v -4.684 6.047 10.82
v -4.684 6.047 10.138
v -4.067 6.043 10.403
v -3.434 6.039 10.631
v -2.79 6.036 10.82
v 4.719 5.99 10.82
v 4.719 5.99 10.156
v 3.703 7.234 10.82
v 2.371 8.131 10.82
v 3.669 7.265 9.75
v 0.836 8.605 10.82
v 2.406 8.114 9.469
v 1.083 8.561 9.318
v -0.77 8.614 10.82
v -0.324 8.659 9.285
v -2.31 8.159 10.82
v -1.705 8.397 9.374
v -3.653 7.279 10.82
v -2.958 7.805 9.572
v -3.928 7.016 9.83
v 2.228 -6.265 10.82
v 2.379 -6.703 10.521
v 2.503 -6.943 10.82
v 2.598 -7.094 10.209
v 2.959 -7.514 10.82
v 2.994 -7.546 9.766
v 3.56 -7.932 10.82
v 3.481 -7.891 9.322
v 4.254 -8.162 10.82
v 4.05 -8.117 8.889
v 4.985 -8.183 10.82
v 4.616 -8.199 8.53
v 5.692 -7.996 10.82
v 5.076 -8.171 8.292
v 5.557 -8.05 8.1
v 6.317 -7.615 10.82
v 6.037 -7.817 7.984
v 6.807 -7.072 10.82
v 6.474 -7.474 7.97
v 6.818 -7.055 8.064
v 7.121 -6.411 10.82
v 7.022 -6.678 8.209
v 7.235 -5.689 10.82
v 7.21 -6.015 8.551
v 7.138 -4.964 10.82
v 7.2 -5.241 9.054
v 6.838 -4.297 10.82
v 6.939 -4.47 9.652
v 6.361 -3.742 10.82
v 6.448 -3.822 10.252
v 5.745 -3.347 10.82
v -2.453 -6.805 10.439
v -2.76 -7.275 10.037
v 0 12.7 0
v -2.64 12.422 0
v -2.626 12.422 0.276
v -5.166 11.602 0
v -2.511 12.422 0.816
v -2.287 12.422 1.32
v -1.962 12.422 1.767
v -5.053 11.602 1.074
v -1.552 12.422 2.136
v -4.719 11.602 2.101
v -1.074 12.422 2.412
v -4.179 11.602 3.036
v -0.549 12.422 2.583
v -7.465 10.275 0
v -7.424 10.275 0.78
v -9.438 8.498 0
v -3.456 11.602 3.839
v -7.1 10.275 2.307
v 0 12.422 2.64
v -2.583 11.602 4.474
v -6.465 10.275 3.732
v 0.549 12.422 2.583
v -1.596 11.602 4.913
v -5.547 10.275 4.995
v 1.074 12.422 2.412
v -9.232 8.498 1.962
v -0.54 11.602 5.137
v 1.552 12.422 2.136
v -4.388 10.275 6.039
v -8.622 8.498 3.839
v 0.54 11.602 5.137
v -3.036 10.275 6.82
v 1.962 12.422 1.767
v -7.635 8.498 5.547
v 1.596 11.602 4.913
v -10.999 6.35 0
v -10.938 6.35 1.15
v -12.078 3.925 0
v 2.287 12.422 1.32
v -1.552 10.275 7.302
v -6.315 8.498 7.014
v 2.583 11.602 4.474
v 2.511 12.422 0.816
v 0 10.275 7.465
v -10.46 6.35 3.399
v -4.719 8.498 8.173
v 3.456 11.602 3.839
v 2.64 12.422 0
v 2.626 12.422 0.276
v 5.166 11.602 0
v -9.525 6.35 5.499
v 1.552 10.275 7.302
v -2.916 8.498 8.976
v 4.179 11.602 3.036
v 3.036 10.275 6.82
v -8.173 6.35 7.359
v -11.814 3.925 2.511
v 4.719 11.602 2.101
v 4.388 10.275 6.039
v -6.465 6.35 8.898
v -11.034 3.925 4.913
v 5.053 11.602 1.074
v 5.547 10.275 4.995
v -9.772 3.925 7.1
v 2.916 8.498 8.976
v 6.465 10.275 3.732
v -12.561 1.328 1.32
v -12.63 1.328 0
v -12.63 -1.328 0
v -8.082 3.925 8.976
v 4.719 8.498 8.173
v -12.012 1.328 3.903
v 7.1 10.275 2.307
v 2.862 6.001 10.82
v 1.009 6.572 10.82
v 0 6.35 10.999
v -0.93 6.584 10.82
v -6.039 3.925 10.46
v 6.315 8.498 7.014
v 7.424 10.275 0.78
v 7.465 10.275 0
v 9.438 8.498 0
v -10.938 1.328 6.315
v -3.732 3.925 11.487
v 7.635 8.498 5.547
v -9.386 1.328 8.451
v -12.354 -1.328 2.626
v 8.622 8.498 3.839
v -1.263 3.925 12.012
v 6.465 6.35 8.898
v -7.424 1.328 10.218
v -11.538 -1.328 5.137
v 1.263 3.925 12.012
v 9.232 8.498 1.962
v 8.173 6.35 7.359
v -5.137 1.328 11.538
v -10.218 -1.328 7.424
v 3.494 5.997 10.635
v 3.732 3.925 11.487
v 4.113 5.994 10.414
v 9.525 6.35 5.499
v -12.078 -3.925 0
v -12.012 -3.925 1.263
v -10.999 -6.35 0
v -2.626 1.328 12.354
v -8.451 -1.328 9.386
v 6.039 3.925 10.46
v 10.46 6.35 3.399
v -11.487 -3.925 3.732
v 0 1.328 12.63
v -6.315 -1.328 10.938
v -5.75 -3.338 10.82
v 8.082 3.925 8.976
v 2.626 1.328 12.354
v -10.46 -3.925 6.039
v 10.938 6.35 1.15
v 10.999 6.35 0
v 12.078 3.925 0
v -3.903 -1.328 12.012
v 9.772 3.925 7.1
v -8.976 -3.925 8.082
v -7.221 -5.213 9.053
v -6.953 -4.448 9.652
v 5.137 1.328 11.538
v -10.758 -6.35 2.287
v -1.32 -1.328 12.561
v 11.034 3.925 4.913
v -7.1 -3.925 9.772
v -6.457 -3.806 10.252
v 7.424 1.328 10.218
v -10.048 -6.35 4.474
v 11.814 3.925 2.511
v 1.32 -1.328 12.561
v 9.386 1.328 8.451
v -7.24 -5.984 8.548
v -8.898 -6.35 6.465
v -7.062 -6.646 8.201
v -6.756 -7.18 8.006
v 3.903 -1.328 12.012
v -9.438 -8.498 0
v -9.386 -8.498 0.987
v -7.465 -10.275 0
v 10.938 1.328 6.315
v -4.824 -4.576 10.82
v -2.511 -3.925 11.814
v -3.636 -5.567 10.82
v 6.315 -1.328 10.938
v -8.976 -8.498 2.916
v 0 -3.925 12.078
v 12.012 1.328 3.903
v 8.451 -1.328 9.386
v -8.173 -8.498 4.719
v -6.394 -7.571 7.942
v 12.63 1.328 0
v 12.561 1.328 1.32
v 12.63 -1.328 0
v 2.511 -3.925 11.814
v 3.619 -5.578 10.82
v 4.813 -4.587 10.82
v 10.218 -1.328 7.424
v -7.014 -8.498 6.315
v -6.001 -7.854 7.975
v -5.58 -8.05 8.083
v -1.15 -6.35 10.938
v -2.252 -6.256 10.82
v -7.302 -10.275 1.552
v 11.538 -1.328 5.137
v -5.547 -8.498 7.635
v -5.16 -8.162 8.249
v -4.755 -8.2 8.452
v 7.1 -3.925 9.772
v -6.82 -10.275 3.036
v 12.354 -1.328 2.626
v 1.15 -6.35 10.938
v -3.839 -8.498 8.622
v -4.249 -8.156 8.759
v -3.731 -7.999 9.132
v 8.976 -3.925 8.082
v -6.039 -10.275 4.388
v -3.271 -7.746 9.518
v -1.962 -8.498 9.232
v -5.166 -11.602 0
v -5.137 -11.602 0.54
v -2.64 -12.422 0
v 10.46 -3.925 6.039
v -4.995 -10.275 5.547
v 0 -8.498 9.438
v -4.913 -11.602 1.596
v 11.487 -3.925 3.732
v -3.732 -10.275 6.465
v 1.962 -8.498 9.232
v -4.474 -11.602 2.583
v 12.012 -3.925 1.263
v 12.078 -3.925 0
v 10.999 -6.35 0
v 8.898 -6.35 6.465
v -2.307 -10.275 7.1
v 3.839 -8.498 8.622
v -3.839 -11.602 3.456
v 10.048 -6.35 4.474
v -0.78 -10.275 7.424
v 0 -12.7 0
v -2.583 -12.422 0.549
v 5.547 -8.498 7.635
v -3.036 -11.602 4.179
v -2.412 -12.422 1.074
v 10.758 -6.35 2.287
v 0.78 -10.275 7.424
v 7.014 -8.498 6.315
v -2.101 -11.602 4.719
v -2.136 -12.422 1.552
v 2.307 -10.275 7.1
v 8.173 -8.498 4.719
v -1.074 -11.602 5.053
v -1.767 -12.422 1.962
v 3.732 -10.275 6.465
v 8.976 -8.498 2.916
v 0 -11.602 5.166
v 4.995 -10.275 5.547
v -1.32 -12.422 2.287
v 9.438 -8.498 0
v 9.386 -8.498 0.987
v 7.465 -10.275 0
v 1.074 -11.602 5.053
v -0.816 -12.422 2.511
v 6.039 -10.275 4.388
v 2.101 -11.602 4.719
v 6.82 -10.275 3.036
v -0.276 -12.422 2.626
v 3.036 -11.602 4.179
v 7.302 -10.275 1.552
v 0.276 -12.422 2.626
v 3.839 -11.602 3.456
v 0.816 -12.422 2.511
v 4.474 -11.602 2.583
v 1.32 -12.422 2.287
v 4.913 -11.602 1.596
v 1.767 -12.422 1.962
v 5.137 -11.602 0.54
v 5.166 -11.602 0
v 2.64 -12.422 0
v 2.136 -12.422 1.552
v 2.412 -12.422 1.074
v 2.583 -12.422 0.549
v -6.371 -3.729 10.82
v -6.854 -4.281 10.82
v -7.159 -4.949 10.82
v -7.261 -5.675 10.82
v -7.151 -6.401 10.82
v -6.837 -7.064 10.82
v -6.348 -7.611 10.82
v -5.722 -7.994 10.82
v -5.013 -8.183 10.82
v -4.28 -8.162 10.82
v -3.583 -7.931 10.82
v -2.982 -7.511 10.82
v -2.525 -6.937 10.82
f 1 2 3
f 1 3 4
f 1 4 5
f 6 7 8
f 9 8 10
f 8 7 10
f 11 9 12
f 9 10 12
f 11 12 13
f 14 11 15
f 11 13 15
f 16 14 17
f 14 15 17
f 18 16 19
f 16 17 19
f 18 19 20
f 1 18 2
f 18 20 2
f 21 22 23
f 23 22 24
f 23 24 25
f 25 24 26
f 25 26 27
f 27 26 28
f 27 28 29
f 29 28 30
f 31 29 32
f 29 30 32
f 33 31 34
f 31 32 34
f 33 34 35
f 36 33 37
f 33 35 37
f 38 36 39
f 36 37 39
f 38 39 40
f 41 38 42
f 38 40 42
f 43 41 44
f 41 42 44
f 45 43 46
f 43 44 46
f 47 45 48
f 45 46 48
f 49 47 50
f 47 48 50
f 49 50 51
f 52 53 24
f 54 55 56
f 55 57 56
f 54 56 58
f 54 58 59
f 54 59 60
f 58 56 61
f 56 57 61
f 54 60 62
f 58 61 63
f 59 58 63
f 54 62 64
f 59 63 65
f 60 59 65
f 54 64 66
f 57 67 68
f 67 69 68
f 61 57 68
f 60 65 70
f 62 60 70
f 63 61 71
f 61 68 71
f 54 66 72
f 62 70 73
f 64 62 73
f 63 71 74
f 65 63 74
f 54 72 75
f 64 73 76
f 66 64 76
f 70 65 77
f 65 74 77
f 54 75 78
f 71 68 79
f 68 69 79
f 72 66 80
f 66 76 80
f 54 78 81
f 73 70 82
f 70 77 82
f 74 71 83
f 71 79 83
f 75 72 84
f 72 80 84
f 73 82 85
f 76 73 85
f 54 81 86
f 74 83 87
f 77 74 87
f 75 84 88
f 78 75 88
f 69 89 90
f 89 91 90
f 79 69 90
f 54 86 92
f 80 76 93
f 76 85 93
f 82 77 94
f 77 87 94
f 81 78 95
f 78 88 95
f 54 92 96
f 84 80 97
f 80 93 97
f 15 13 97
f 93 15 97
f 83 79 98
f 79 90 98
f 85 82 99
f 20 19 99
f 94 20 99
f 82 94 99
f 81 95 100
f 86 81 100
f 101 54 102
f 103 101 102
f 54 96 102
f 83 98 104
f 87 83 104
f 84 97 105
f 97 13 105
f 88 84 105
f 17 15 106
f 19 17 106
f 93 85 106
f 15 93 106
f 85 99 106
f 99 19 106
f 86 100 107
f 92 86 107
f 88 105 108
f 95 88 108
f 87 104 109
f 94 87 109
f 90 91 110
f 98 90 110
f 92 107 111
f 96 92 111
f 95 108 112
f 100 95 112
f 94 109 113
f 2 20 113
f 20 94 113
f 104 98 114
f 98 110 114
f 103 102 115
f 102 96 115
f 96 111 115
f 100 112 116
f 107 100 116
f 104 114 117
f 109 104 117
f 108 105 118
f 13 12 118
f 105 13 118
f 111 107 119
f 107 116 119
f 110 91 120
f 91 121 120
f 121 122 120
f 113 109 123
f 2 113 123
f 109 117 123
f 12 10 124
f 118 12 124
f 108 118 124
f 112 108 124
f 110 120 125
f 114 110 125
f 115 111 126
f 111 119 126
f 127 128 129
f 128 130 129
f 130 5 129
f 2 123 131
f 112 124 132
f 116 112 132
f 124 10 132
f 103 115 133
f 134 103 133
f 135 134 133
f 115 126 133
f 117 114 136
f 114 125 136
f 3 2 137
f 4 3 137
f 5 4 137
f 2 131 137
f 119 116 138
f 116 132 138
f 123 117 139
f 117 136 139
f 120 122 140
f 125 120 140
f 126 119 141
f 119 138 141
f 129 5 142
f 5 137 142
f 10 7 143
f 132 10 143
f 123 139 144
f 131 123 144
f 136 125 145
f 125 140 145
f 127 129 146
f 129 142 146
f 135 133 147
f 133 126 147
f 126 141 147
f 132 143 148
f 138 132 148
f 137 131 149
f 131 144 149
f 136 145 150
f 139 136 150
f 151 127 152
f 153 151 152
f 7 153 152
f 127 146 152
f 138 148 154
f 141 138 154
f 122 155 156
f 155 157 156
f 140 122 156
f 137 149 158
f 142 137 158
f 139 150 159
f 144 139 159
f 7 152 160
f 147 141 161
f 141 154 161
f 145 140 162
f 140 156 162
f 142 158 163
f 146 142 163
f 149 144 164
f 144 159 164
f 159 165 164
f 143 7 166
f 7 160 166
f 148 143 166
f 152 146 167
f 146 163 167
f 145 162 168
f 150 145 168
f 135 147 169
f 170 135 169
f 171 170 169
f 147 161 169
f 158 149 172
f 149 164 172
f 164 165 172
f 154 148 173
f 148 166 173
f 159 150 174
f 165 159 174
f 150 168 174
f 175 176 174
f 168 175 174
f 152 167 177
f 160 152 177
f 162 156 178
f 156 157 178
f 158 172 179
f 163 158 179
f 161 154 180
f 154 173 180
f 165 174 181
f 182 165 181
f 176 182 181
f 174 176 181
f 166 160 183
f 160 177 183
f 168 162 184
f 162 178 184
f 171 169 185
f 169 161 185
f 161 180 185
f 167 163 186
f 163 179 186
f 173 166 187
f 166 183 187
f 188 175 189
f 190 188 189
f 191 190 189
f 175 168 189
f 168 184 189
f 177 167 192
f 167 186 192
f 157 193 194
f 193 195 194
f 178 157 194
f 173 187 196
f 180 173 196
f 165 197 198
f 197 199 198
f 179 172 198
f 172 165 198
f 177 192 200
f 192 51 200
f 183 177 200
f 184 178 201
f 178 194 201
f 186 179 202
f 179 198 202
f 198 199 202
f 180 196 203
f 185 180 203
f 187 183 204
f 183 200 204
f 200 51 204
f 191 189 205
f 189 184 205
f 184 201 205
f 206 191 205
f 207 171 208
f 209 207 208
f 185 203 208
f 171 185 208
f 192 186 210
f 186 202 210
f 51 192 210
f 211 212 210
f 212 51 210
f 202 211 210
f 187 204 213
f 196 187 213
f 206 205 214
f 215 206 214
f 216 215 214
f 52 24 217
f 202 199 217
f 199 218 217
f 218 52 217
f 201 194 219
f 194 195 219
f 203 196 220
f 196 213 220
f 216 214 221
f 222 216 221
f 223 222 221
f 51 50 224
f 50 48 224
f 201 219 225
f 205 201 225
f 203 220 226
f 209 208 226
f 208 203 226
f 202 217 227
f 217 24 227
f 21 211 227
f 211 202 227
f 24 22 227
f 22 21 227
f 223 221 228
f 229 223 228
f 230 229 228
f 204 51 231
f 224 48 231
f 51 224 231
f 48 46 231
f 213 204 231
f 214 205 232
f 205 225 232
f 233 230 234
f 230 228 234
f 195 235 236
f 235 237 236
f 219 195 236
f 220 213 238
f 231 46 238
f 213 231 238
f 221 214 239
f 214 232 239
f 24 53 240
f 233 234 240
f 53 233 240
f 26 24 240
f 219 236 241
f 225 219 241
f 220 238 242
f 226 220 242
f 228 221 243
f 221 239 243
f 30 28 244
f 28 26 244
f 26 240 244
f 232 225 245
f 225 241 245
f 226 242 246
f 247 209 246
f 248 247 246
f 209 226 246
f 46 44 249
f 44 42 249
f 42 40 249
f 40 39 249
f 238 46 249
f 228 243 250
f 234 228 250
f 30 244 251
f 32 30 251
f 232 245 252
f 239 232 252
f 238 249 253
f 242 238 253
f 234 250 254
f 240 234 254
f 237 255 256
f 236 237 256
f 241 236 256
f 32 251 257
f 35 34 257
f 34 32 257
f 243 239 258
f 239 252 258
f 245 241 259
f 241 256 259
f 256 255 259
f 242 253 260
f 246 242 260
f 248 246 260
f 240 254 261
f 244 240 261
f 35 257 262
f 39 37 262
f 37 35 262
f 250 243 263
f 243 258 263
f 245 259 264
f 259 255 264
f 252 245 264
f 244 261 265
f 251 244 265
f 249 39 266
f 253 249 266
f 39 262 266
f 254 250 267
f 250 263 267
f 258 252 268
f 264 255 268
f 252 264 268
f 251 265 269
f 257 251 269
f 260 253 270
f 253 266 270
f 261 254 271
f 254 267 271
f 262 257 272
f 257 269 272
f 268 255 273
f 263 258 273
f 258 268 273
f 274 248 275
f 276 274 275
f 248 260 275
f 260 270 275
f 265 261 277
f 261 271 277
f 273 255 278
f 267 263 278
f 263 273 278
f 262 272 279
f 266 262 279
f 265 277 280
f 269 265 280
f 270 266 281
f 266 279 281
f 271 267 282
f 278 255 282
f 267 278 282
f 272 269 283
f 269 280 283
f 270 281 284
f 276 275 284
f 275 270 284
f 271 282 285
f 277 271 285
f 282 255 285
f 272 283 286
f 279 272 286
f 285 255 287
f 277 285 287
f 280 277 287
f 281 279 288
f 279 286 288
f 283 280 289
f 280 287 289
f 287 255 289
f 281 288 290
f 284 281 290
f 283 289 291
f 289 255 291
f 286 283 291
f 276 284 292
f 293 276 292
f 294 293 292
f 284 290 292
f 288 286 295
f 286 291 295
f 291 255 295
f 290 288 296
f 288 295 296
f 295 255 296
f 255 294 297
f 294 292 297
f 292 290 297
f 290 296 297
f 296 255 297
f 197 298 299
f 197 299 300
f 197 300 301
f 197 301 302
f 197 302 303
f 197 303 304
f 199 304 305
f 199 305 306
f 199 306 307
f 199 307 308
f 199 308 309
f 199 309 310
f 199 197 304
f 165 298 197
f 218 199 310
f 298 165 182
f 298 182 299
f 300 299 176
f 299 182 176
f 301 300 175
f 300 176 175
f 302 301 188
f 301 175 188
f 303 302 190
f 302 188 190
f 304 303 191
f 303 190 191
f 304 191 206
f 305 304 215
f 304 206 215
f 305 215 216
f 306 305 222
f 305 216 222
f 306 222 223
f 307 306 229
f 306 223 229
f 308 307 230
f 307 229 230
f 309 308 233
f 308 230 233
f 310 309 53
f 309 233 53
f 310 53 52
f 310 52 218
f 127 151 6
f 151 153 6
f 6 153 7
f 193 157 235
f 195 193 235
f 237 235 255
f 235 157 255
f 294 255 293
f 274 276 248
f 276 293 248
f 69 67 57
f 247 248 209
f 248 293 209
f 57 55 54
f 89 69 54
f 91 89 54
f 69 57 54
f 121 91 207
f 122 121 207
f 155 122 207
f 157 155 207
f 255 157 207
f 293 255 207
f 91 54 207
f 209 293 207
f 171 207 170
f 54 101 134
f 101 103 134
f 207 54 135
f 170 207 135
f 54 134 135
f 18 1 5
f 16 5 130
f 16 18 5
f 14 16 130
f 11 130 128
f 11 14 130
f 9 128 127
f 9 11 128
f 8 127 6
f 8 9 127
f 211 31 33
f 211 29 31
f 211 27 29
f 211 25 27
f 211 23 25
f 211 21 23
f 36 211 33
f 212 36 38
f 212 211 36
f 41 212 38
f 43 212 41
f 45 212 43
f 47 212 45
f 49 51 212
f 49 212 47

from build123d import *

# Parameters (mm, degrees)
F1_ANGLE = 180
F2_R     = 2.54
F4_DEPTH = 10.8204


with BuildPart() as f1:
    # F0 (on Top) → F1 (revolve)
    with BuildSketch(Plane.XY):
        with BuildLine():
            Line((0, 0), (0, 12.7))
            ThreePointArc((0, 12.7), (-12.7, 0), (0, -12.7))
            Line((0, -12.7), (0, 0))
        make_face()
    revolve(axis=Axis((0, 0, 0), (0, 1, 0)), revolution_arc=F1_ANGLE)

    # F3 (on Top) + F2 (on Top) → F4 (join)
    with BuildSketch(Plane.XY):
        with BuildLine():
            Line((-4.6839732677, 6.046992261), (4.7185341828, 5.9900078923))
            ThreePointArc((4.7185341828, 5.9900078923), (0.0333416464, 8.6686206572), (-4.6839732677, 6.046992261))
        make_face()
    with BuildSketch(Plane.XY):
        with Locations((4.695169162, -5.6601171382)):
            Circle(F2_R)
        with Locations((-4.7209146433, -5.6601171382)):
            Circle(F2_R)
    extrude(amount=F4_DEPTH)


solid = f1.part
